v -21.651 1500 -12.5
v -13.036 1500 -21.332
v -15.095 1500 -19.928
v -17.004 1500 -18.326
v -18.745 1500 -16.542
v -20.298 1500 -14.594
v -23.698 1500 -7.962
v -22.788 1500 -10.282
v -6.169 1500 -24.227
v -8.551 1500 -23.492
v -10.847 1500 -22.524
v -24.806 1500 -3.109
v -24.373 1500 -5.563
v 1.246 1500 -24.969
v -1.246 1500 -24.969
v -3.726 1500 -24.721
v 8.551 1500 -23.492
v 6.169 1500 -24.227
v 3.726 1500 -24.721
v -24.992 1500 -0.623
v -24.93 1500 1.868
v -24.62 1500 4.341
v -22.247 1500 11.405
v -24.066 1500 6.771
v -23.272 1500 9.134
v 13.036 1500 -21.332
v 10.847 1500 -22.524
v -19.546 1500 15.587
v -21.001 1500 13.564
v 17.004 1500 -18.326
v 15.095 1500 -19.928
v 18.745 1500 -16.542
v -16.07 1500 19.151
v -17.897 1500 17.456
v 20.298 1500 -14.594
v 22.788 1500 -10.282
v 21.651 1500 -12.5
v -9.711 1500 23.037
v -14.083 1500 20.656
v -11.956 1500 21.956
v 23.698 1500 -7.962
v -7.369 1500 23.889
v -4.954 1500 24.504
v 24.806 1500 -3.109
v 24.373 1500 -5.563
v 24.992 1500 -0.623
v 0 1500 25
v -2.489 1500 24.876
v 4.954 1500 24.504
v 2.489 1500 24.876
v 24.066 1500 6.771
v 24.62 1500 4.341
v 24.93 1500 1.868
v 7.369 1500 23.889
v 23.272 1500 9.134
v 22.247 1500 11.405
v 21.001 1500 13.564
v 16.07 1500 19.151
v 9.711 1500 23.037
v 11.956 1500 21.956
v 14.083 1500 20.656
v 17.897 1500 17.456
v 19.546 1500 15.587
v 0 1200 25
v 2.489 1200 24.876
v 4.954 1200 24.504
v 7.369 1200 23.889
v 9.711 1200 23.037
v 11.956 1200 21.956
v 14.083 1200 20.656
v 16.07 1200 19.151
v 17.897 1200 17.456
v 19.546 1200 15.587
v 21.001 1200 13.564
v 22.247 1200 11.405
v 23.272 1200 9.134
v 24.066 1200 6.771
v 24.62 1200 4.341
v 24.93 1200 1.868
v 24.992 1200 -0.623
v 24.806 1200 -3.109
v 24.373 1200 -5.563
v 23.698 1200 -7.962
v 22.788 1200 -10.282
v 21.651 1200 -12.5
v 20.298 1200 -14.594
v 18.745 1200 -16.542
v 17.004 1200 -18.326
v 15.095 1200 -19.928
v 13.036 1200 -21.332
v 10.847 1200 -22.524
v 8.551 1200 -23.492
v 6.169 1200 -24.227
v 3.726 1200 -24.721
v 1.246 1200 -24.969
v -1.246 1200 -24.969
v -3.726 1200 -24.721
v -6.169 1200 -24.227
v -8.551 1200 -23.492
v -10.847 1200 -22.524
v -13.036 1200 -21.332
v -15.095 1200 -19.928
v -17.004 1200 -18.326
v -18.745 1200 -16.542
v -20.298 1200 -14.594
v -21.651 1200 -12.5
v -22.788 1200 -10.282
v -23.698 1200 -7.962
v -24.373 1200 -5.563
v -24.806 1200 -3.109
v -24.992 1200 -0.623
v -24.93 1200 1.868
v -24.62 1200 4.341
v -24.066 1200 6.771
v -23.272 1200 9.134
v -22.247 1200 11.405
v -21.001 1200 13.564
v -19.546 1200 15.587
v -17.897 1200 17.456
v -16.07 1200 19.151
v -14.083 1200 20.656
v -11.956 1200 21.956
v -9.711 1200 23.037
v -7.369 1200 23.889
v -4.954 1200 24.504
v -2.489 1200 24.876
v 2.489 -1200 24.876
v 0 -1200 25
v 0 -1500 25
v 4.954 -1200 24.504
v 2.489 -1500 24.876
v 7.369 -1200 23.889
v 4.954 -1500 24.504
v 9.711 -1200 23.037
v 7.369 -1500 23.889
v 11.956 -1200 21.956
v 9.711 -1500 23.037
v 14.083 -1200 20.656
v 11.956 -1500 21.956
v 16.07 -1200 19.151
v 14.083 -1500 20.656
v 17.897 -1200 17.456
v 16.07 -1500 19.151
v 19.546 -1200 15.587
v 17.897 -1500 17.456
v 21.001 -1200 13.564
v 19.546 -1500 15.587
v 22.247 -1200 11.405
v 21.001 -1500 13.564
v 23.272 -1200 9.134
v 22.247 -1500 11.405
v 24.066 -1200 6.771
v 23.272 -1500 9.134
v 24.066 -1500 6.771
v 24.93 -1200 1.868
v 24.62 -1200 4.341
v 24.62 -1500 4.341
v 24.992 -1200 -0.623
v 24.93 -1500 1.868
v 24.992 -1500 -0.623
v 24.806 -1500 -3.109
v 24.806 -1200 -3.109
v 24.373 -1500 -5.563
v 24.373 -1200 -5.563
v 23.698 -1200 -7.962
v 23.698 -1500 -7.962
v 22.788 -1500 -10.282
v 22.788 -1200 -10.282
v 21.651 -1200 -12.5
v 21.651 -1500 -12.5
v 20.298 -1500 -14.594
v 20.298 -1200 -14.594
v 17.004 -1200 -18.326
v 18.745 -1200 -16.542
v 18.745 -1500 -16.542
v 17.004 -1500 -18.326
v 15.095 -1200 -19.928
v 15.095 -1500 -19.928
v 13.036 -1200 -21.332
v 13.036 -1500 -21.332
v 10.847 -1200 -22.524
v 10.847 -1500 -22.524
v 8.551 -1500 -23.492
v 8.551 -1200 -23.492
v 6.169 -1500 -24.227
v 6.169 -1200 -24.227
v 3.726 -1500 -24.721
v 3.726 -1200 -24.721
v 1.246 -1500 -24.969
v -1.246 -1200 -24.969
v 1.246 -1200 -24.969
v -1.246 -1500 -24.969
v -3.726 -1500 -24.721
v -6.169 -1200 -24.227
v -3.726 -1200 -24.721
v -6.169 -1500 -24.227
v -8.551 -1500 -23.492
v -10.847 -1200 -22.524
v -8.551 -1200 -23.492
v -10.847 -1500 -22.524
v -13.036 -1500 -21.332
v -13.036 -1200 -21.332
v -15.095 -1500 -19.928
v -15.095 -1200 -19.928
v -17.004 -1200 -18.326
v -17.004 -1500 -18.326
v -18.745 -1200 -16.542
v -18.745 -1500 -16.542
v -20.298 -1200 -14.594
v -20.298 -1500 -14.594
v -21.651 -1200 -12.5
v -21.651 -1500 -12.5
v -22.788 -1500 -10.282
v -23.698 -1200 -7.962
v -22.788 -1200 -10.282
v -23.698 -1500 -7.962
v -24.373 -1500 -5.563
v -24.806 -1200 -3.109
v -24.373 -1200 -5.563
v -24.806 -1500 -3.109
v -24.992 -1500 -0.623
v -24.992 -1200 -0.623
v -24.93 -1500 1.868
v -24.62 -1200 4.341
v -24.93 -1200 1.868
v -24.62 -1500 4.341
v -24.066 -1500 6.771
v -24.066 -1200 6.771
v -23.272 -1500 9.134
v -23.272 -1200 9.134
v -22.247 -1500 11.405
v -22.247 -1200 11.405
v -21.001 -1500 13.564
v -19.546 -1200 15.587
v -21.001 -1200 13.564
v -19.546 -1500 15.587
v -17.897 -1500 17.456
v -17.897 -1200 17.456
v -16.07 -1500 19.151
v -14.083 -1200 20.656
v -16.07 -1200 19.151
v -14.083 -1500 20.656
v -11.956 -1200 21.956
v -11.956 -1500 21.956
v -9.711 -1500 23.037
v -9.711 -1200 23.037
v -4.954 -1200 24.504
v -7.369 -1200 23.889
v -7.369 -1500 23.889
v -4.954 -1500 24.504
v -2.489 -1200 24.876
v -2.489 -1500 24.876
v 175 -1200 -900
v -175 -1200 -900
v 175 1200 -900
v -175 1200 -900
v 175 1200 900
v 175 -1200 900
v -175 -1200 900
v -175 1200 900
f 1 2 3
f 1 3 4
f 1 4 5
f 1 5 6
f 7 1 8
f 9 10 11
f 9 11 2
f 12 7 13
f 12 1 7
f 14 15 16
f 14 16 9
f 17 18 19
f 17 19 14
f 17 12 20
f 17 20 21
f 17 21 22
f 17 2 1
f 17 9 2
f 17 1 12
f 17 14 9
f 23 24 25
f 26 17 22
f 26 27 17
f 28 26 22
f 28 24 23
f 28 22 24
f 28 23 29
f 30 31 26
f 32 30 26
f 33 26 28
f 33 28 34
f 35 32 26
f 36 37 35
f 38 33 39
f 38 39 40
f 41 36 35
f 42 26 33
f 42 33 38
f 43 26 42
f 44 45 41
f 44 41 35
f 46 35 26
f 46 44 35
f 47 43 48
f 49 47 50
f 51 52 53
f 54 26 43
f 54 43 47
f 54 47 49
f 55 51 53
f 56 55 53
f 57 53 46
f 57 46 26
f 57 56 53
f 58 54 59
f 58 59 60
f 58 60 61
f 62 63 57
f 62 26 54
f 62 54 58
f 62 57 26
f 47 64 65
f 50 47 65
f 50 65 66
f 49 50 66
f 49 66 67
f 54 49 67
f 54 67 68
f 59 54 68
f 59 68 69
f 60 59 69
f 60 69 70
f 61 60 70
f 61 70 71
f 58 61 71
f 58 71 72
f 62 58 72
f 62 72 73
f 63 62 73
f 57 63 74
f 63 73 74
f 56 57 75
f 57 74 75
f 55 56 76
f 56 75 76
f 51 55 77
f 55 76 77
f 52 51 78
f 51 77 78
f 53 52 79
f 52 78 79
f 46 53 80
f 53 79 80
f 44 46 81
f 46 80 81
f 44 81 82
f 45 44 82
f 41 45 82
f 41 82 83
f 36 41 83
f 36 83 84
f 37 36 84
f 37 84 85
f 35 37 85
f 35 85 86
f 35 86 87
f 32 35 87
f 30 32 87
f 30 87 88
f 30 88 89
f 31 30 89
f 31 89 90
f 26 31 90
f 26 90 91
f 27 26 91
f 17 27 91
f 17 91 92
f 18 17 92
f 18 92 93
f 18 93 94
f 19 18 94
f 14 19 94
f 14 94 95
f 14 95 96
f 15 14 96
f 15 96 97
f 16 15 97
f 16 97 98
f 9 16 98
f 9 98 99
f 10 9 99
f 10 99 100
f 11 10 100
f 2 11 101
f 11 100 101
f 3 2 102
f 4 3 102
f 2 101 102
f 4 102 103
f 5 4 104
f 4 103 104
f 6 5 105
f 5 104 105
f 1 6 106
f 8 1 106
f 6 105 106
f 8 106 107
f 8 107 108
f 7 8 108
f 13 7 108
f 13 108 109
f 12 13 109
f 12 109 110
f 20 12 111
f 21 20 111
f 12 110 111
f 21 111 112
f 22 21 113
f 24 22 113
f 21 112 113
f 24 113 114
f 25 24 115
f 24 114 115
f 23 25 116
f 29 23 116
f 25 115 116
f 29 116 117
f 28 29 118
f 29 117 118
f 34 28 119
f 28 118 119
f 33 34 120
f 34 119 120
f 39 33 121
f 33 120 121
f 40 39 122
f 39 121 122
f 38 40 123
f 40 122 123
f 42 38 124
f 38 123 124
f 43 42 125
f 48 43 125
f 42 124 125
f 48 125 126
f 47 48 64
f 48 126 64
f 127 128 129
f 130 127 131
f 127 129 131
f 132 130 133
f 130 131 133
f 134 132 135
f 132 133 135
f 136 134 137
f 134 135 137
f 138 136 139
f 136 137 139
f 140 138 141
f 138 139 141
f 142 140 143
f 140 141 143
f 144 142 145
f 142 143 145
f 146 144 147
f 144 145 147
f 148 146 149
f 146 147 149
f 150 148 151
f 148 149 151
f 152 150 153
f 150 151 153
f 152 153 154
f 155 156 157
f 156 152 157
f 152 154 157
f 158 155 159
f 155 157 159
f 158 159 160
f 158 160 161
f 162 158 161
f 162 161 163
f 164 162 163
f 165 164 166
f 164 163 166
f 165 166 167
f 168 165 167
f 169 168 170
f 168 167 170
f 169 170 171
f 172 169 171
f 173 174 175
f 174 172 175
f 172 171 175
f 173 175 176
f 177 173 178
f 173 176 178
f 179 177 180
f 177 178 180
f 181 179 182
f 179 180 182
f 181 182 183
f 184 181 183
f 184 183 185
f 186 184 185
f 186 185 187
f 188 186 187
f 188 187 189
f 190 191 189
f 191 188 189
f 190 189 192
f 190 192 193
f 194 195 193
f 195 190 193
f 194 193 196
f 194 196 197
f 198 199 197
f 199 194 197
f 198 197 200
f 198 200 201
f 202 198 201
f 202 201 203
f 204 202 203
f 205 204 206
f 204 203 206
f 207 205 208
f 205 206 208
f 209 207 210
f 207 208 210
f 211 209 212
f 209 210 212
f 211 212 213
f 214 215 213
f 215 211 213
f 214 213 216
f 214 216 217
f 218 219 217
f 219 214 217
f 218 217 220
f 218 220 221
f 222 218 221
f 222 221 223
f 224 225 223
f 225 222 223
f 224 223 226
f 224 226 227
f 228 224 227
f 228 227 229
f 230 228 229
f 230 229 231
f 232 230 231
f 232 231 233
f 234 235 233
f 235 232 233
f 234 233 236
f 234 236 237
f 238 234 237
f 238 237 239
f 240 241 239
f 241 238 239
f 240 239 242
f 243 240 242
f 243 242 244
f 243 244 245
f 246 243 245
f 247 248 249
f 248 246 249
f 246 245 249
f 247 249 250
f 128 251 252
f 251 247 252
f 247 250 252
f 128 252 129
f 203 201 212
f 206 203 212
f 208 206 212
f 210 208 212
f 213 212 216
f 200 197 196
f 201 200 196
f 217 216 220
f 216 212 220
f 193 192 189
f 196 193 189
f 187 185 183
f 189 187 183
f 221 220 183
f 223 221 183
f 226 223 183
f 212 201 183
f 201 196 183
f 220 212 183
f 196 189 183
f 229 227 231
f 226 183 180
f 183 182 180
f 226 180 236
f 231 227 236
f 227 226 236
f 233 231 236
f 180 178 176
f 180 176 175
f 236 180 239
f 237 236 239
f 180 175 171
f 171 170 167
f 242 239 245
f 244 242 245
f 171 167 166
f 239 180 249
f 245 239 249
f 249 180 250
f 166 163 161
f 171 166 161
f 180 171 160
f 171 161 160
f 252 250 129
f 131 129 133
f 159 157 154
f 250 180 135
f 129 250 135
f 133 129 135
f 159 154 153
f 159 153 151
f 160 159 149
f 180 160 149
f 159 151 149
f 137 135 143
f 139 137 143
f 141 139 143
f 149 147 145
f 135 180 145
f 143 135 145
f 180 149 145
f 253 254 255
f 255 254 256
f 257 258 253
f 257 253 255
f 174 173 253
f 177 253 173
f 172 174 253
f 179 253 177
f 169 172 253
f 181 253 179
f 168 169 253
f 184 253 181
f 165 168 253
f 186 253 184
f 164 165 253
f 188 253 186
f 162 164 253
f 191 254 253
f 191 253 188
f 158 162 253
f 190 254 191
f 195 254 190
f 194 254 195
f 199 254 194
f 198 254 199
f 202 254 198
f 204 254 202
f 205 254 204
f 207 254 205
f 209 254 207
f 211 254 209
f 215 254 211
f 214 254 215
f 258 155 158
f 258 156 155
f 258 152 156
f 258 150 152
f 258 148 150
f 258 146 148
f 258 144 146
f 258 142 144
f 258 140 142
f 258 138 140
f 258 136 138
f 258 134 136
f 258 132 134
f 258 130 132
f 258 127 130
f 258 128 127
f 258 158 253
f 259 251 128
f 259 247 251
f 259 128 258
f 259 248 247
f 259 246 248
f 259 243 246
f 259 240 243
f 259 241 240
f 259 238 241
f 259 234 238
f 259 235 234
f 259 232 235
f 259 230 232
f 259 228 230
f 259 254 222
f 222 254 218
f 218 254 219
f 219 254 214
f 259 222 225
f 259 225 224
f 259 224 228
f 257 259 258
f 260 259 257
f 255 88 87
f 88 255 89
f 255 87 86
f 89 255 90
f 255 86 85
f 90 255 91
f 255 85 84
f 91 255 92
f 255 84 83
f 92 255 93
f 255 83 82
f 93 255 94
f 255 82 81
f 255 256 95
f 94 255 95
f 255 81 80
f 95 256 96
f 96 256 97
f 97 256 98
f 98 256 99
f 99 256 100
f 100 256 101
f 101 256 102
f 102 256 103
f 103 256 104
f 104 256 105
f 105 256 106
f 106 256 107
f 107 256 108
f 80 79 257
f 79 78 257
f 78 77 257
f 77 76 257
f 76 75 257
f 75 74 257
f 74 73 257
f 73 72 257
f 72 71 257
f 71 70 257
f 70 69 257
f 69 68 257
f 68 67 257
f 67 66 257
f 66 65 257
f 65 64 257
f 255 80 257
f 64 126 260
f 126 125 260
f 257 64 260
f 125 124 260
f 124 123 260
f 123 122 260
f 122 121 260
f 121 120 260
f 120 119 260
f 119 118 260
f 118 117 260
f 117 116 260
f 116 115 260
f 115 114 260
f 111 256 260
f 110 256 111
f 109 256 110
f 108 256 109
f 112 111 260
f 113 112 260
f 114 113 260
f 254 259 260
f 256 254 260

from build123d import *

# Parameters (mm, degrees)
BOSS_EXTRUDE1_DEPTH      = 175
BOSS_EXTRUDE1_DEPTH_BACK = 175
SKETCH1_W                = 2400
SKETCH1_H                = 1800
BOSS_EXTRUDE2_DEPTH      = 1500
BOSS_EXTRUDE2_DEPTH_BACK = 1500
SKETCH2_R                = 25


with BuildPart() as part:
    # Sketch1 → Boss-Extrude1 (new, two sides: drawn at the far end of the back side and taken through both)
    with BuildSketch(Plane.YZ.offset(-BOSS_EXTRUDE1_DEPTH_BACK)):
        Rectangle(SKETCH1_W, SKETCH1_H)
    extrude(amount=BOSS_EXTRUDE1_DEPTH + BOSS_EXTRUDE1_DEPTH_BACK)

    # Sketch2 → Boss-Extrude2 (add, two sides: drawn at the far end of the back side and taken through both)
    with BuildSketch(Plane(origin=(0, 0, 0), x_dir=(1, 0, 0), z_dir=(0, 1, 0)).offset(-BOSS_EXTRUDE2_DEPTH_BACK)):
        Circle(SKETCH2_R)
    extrude(amount=BOSS_EXTRUDE2_DEPTH + BOSS_EXTRUDE2_DEPTH_BACK)


solid = part.part
